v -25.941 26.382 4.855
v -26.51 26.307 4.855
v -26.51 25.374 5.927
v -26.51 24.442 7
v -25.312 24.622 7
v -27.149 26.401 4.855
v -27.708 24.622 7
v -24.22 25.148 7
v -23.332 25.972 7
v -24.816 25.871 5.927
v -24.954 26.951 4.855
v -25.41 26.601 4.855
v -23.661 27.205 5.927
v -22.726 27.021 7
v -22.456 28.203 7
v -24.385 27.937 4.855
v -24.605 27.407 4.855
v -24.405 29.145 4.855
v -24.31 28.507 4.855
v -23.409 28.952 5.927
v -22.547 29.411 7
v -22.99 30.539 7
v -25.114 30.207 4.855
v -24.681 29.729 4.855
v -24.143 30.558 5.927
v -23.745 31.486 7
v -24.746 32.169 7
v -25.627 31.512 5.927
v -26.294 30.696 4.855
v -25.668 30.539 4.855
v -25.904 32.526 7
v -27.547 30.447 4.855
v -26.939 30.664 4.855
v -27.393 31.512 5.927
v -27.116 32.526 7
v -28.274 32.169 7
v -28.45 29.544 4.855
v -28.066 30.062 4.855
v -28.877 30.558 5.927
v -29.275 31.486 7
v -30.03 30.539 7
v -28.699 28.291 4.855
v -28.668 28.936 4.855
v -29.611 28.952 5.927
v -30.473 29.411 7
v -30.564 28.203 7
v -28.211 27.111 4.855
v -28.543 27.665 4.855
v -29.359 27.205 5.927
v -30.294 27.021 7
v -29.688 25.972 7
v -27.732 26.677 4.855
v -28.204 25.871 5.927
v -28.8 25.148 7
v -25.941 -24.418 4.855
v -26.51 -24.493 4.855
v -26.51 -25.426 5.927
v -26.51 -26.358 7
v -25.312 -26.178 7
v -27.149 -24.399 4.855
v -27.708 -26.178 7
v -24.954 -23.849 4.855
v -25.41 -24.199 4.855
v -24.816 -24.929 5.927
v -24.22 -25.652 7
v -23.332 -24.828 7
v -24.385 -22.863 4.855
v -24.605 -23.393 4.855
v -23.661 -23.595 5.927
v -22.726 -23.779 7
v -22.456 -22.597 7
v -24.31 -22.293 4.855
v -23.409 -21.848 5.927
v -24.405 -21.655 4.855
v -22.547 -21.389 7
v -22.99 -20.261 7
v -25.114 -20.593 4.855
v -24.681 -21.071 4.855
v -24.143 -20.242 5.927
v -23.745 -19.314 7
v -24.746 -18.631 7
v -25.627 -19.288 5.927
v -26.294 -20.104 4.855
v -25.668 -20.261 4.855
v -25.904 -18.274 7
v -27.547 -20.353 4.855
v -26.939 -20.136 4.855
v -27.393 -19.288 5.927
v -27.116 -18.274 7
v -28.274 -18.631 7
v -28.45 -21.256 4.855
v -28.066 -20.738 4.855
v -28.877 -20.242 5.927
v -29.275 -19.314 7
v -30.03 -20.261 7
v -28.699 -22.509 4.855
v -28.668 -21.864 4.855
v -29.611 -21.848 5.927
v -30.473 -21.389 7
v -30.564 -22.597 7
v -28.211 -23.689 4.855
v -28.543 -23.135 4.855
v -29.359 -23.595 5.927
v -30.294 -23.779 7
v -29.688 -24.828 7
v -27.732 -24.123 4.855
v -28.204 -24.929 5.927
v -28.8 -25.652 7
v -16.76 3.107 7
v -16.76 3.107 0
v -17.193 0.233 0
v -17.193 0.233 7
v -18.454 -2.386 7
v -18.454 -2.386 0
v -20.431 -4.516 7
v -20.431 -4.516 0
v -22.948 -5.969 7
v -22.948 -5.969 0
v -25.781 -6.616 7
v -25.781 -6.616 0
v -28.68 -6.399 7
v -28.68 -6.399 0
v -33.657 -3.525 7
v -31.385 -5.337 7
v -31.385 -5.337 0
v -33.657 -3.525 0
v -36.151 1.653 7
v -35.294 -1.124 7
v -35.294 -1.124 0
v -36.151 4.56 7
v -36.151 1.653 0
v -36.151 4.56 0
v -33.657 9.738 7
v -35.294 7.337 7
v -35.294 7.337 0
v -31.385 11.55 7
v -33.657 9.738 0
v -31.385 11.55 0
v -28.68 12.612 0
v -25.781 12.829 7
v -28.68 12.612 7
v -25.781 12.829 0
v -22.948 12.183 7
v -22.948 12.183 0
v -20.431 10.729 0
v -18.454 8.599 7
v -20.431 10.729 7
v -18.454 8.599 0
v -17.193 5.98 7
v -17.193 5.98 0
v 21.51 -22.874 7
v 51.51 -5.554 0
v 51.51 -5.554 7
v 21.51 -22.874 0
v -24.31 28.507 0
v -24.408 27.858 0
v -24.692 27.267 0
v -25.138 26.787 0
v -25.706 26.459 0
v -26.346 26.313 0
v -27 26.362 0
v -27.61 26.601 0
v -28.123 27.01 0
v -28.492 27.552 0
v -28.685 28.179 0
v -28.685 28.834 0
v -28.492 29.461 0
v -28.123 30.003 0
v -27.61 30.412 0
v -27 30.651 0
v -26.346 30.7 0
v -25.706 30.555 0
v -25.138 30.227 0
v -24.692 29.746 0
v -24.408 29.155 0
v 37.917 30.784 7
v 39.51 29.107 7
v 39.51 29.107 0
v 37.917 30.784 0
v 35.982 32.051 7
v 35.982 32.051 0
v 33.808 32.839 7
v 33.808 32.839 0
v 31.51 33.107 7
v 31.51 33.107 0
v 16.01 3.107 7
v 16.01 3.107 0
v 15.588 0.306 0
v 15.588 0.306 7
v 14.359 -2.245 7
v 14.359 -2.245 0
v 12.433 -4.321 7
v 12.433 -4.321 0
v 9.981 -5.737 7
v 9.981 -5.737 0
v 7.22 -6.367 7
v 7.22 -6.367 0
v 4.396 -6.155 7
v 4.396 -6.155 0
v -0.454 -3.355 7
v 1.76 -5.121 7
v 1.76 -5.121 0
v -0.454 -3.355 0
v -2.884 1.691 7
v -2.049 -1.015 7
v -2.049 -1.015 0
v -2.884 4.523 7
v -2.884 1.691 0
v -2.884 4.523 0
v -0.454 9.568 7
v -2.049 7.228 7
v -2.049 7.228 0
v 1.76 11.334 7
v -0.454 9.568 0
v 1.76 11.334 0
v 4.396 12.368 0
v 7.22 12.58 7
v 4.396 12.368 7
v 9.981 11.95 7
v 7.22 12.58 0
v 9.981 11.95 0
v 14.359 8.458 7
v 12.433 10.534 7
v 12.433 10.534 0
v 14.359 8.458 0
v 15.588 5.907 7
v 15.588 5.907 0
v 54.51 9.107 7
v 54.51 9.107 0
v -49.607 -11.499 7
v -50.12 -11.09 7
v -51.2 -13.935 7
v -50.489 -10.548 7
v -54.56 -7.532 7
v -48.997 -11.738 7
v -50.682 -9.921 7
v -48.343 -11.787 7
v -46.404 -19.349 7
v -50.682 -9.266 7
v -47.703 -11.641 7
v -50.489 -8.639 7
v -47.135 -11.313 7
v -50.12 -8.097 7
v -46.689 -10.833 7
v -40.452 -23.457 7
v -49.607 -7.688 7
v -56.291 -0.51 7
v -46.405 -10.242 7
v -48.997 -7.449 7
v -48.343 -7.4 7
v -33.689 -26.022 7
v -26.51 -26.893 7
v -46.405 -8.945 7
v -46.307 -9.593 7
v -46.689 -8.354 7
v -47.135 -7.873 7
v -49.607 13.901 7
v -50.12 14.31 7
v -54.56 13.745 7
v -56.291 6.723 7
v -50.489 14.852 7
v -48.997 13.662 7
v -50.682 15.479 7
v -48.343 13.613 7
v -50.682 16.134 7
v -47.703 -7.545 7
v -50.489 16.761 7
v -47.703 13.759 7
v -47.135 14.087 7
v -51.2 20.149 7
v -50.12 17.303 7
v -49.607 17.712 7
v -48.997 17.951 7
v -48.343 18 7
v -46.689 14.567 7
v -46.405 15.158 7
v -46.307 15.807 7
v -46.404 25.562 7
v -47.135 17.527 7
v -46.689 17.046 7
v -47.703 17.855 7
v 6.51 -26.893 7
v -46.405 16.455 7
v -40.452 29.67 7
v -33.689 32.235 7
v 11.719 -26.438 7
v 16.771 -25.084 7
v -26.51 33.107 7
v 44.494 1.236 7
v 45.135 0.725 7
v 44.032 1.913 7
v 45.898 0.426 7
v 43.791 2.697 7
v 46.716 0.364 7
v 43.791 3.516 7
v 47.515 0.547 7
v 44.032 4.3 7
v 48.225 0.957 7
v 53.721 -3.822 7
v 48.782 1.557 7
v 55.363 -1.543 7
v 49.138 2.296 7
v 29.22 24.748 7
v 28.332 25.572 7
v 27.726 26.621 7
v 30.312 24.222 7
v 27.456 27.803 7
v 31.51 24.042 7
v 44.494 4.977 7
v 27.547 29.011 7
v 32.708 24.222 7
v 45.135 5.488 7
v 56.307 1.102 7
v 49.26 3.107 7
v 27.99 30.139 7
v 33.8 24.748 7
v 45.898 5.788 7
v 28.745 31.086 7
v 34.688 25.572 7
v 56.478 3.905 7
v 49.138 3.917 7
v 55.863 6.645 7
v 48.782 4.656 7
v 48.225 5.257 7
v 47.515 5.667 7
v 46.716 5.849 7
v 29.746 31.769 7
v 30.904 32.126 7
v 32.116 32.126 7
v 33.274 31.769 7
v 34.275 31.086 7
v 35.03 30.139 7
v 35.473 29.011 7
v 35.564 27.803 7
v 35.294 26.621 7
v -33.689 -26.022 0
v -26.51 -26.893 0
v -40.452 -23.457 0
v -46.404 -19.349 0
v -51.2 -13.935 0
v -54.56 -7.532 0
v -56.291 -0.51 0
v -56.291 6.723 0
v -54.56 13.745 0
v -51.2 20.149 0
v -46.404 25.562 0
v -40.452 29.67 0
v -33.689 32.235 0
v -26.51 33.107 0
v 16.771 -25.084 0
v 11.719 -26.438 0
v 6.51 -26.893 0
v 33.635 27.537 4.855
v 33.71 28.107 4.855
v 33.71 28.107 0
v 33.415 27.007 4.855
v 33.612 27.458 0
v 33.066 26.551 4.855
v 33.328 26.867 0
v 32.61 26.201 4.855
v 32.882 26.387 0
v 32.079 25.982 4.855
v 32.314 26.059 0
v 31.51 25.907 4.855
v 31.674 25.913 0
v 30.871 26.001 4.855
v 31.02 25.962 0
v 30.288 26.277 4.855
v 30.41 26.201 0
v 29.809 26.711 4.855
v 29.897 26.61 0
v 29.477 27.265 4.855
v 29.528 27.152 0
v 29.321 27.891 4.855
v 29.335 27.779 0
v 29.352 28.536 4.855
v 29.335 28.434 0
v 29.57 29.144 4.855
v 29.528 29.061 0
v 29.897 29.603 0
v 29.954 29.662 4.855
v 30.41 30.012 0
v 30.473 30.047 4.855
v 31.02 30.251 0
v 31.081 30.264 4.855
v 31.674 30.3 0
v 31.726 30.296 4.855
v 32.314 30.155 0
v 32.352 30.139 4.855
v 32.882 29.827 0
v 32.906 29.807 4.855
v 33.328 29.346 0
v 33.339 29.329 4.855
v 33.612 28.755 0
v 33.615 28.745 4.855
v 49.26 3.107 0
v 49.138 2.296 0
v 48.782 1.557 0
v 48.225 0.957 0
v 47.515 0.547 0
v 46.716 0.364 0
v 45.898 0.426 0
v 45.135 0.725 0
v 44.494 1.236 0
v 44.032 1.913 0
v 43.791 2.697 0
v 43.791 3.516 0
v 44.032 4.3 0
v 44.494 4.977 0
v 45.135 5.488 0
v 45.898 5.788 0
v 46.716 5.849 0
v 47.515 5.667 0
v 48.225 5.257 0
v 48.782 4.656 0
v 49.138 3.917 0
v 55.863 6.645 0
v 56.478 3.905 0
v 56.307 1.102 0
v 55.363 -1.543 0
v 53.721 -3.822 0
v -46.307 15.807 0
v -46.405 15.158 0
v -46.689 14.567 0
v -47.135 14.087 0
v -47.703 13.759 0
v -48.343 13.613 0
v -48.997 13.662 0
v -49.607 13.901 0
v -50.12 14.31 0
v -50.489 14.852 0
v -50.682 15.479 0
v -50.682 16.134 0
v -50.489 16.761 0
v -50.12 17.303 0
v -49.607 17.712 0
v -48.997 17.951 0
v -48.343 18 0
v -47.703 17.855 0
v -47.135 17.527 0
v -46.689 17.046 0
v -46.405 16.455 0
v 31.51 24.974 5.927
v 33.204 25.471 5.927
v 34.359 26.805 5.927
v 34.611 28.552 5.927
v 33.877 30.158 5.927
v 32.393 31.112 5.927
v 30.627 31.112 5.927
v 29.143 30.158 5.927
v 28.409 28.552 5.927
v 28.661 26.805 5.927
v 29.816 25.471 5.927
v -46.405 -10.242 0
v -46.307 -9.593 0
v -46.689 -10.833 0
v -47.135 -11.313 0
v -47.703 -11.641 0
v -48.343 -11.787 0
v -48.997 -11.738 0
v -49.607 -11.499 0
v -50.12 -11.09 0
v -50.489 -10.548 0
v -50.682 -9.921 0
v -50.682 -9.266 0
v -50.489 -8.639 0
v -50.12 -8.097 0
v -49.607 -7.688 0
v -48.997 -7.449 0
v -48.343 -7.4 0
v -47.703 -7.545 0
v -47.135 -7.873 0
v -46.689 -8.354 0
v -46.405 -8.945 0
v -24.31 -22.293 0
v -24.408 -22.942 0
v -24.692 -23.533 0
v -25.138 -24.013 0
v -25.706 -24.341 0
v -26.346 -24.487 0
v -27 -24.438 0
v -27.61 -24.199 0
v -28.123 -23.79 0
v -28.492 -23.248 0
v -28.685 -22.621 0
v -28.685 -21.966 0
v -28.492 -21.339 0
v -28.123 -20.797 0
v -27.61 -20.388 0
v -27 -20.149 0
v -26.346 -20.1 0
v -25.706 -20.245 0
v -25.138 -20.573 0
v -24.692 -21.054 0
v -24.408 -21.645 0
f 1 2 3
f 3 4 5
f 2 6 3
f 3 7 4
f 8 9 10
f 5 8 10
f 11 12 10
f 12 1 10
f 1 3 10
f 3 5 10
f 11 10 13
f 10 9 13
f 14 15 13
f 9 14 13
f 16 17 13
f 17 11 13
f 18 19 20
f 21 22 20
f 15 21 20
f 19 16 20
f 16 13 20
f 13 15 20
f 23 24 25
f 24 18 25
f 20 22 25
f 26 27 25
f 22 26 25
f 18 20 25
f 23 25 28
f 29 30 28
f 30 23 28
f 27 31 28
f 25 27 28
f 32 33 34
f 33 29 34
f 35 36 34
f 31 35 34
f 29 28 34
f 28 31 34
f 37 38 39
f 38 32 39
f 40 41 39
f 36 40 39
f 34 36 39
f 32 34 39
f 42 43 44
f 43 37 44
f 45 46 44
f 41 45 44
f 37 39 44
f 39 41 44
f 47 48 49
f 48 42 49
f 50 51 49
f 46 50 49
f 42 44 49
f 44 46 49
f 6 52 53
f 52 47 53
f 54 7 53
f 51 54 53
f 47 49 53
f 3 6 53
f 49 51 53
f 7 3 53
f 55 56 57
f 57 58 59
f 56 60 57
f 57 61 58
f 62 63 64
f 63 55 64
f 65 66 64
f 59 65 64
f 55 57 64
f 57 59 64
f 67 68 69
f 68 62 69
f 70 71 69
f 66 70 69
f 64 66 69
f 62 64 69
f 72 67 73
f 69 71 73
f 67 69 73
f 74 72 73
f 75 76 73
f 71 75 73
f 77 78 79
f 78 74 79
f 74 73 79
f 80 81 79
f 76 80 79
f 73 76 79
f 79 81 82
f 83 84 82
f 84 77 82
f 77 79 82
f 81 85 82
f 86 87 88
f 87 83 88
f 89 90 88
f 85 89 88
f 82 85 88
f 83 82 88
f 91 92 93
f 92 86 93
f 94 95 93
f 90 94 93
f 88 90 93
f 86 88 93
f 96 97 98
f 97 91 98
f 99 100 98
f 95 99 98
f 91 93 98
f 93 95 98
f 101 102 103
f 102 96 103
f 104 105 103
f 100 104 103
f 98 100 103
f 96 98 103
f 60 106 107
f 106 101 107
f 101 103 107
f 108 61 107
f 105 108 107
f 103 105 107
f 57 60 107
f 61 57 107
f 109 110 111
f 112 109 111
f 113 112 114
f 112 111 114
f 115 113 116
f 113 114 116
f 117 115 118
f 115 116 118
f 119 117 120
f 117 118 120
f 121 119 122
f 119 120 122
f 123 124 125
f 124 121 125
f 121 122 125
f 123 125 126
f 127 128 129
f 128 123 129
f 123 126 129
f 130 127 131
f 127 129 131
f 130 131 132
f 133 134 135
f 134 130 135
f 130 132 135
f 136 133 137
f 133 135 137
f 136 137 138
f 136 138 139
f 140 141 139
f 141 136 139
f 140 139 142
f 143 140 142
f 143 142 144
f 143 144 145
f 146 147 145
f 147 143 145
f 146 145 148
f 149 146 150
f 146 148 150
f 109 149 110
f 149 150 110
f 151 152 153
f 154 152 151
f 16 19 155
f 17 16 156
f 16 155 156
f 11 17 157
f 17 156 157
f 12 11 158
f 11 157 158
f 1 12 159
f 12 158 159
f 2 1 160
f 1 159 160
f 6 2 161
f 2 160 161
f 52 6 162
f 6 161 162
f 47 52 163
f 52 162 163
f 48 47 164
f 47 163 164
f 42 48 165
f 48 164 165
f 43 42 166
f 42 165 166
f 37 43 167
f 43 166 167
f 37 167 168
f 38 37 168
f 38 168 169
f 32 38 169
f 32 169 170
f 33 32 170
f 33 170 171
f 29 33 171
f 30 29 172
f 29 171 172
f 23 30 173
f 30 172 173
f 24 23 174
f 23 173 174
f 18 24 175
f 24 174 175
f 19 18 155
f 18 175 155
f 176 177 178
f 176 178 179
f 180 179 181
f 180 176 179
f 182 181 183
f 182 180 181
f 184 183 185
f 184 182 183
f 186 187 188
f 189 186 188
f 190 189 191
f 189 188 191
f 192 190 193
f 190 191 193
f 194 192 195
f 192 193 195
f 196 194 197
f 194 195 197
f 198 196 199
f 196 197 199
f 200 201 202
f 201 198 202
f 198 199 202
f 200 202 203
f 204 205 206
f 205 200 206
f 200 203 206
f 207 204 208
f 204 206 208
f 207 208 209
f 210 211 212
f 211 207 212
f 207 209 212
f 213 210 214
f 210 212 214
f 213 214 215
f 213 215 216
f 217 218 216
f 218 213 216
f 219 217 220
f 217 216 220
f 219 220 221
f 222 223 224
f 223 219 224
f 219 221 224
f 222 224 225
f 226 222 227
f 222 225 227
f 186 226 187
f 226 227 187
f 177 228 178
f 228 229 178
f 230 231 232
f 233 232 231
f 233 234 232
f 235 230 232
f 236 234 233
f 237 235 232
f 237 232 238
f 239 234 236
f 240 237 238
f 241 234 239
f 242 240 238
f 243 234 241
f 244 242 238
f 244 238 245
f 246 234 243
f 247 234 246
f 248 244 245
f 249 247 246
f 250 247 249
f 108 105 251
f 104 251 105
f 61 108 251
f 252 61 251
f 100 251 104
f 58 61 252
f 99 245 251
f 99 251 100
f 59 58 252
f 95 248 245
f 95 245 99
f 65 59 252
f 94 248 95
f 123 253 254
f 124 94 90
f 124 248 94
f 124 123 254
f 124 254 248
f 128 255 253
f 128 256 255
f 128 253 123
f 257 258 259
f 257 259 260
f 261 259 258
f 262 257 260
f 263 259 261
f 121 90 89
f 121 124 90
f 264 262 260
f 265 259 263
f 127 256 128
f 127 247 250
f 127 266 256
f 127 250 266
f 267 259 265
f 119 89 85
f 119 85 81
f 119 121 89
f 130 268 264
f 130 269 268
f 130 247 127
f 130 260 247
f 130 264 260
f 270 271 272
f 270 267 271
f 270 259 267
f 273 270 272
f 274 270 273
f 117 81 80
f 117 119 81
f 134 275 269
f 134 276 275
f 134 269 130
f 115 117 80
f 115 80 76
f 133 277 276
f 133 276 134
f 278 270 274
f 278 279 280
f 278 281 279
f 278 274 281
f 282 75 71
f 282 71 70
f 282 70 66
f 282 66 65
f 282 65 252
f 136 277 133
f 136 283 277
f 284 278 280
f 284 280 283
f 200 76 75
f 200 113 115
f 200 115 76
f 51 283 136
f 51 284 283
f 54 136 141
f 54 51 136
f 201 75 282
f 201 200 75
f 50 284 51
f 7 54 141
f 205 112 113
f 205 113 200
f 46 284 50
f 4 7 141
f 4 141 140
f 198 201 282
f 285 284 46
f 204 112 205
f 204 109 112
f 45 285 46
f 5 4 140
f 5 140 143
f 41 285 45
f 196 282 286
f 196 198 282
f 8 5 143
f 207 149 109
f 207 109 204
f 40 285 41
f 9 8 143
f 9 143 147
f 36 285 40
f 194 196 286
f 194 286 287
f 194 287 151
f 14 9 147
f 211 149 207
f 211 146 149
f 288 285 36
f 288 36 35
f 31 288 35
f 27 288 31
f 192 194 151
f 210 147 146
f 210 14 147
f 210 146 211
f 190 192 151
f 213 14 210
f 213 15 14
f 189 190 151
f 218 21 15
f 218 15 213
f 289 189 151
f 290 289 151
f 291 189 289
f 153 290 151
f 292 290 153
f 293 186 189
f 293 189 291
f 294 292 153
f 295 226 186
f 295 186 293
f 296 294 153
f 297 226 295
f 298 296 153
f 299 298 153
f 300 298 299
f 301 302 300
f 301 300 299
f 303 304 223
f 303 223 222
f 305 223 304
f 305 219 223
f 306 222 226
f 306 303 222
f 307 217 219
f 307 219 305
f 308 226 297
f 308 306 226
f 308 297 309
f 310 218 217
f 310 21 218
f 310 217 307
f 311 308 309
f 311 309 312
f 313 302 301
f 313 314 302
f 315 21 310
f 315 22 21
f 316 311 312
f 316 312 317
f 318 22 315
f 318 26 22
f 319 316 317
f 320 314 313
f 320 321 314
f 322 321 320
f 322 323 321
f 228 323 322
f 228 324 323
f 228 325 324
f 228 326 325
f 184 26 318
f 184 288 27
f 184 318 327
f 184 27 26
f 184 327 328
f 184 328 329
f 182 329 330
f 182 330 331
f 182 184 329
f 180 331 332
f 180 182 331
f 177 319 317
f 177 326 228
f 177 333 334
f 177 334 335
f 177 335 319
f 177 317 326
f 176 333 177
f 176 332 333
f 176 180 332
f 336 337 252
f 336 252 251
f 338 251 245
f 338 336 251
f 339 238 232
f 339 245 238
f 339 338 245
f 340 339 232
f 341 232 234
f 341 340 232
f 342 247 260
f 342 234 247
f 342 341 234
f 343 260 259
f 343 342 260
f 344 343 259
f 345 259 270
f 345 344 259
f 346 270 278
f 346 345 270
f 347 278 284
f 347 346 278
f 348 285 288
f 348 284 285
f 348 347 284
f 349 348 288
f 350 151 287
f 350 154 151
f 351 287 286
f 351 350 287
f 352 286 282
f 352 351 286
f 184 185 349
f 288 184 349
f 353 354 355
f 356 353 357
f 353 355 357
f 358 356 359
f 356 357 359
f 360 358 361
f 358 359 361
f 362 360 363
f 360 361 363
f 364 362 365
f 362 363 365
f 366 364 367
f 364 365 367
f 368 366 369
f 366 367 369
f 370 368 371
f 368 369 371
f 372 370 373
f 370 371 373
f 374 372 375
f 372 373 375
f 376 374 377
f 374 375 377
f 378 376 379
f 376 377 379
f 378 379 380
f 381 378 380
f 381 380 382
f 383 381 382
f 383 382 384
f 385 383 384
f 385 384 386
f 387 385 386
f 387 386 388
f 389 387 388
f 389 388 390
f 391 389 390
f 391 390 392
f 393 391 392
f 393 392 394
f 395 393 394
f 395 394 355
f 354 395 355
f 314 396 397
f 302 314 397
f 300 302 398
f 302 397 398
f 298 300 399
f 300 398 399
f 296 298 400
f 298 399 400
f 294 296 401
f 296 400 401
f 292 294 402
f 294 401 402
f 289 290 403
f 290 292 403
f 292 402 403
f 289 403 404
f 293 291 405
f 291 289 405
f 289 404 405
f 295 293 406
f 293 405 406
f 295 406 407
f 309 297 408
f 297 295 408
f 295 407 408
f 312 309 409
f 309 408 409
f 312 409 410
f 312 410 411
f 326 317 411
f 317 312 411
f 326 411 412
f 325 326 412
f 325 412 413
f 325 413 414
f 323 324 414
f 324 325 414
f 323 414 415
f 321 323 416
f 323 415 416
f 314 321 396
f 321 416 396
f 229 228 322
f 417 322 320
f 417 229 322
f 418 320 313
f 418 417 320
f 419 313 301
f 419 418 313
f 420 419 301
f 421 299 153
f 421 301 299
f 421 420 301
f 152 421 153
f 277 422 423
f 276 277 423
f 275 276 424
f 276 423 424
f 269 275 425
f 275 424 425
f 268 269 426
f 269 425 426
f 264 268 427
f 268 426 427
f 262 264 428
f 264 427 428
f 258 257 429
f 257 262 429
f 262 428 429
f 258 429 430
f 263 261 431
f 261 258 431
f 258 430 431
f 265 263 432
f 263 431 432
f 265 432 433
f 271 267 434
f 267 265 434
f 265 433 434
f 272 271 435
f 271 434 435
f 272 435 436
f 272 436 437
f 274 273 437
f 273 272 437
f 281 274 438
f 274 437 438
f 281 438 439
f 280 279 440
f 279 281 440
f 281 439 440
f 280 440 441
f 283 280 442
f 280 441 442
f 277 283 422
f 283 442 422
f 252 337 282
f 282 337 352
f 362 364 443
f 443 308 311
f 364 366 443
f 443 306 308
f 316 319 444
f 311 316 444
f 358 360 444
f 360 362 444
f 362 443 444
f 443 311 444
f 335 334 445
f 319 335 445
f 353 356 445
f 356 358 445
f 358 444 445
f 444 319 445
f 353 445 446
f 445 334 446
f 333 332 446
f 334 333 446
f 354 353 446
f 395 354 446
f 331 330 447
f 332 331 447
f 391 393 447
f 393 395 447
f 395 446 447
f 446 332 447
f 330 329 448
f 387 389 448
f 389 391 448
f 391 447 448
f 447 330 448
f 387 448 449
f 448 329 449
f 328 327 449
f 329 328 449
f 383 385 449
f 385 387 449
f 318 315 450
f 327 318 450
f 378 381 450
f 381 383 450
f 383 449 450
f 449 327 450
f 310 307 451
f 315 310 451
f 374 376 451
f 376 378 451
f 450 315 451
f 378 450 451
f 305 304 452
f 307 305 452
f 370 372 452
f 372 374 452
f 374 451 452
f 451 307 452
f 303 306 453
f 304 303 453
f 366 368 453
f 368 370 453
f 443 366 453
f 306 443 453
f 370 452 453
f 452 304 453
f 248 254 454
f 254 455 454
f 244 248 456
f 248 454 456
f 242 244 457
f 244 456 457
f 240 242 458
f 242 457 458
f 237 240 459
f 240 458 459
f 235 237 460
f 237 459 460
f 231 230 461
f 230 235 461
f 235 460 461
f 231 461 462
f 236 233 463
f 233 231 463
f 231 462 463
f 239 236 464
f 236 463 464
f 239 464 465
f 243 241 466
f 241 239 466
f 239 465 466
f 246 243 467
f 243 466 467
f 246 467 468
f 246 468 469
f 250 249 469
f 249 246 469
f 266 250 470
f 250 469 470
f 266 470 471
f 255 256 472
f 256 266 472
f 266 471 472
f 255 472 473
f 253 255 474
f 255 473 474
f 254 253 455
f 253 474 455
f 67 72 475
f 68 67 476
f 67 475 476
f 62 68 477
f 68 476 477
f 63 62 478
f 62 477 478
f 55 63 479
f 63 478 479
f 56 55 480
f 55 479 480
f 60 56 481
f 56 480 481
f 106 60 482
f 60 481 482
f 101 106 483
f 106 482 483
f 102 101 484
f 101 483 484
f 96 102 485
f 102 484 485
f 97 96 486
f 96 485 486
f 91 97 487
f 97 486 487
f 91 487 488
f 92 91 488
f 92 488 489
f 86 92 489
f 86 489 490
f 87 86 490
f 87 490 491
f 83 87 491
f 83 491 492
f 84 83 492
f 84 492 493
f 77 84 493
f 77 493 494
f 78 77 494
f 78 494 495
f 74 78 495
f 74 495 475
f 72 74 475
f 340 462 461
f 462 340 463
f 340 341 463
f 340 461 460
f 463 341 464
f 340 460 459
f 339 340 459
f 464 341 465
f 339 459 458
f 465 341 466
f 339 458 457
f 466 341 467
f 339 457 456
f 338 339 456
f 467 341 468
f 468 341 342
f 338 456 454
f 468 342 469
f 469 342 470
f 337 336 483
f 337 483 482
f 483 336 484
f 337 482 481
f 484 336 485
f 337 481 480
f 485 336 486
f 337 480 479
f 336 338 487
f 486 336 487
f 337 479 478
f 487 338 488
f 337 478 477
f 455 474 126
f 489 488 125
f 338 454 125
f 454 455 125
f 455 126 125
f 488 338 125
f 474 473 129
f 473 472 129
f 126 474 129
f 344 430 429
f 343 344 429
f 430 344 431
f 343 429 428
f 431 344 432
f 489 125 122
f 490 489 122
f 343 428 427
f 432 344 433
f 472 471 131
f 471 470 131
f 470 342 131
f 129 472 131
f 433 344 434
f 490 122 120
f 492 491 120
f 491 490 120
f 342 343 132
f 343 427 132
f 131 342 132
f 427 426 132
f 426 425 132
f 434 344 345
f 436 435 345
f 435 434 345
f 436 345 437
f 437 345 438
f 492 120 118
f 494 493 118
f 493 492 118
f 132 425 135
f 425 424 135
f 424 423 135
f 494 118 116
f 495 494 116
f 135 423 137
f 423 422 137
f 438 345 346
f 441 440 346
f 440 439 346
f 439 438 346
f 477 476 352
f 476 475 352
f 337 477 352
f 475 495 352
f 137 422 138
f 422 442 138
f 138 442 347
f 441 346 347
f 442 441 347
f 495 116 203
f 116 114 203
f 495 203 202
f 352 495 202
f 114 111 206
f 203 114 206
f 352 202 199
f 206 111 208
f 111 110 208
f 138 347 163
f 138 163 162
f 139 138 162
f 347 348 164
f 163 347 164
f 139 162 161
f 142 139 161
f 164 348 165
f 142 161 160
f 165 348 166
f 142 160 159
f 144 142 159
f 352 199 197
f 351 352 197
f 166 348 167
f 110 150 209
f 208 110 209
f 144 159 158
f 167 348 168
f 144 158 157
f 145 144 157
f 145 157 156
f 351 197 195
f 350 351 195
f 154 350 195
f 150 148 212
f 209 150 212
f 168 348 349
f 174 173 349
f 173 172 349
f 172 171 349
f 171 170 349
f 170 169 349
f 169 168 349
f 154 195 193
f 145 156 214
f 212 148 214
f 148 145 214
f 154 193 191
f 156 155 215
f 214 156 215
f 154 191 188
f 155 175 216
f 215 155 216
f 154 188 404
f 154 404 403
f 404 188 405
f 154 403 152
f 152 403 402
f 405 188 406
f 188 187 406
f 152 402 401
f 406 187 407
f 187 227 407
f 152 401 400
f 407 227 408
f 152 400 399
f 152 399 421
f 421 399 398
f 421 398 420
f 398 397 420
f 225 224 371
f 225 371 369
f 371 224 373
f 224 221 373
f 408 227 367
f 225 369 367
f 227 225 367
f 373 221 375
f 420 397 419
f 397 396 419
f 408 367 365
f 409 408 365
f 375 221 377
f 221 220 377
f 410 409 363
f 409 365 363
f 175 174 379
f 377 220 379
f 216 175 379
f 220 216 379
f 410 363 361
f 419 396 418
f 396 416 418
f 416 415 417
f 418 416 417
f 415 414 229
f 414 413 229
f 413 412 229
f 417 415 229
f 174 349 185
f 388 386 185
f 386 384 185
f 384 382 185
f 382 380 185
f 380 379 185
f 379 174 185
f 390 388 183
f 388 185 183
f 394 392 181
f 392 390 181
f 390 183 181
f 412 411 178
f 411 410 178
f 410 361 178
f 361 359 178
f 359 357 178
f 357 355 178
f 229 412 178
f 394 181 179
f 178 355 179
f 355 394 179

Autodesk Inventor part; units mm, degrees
ref_plane "YZ Plane" through (0, 0, 0) normal (1, 0, 0) x (0, 1, 0)
ref_plane "XZ Plane" through (0, 0, 0) normal (0, 1, 0) x (-1, 0, 0)
ref_plane "XY Plane" through (0, 0, 0) normal (0, 0, 1) x (1, 0, 0)
sketch "Sketch1" plane through (-26.51, 3.1066, 0) normal (0, 0, 1) x (1, 0, 0)
  circle A0 centre (0, 0) radius 7.62 construction
  circle A1 centre (0, 0) radius 9.75
  circle A2 centre (33.02, 0) radius 25.4 construction
  line L0 (0, 0) -> (7.62, 0)
  line L1 (0, 0) -> (7.62, 0) construction
  circle A3 centre (33.02, 0) radius 9.5
  line L2 (0, -30) -> (33.02, -30)
  line L3 (33.02, 30) -> (0, 30)
  arc A4 (33.02, -30) -> (63.02, 0) centre (33.02, 0) ccw
  arc A5 (0, 30) -> (0, -30) centre (0, 0) ccw
  circle A6 centre (0, 0) radius 25.4 construction
  line L4 (0, 25.4) -> (0, 0) construction
  line L5 (0, 25.4) -> (25.4, 25.4) construction
  circle A7 centre (0, 25.4) radius 2.2
  circle A8 centre (-21.997, 12.7) radius 2.2
  circle A9 centre (-21.997, -12.7) radius 2.2
  circle A10 centre (0, -25.4) radius 2.2
  circle A11 centre (21.997, -12.7) radius 2.2
  circle A12 centre (21.997, 12.7) radius 2.2
  line L6 (63.02, 0) -> (63.02, 30)
  line L7 (63.02, 30) -> (33.02, 30)
  circle A13 centre (58.02, 25) radius 2.2
  circle A14 centre (73.02, 0) radius 2.75
  circle A15 centre (73.02, 0) radius 10
  line L8 (81.02, 6) -> (63.02, 30)
  line L9 (78.02, -8.6603) -> (48.02, -25.9808)
  dimension "d13" = 50.8
  dimension "d21" = 15.24
  dimension "d20" = 19.5
  dimension "d18" = 50.8
  dimension "d17" = 7.62
  dimension "d25" = 0
  dimension "d19" = 33.02
  dimension "d16" = 19
  dimension "d14" = 30
  dimension "d15" = 60
  dimension "d26" = 25.4
  dimension "d27" = 90
  dimension "d12" = 4.4
  dimension "d2" = 360
  dimension "d11" = 30
  dimension "d9" = 30
  dimension "d10" = 90
  dimension "d6" = 4.4
  dimension "d8" = 5
  dimension "d7" = 5
  dimension "d4" = 5.5
  dimension "d5" = 10
  dimension "d3" = 20
extrude "Extrusion1" add sketch "Sketch1" along normal blind 7 contours A5 L3 L7 L6 A4 L2 | A4 A15 L9 | L6 L8 A15 | A15 | A11 | A12
fillet "Fillet1" radius 10 1 edges at (36.51, 33.1066, 3.5)
sketch "Sketch2" plane through (-26.51, 3.1066, 7) normal (0, 0, 1) x (1, 0, 0)
  circle A0 centre (0, 25.4) radius 2.2 projected
  circle A1 centre (0, -25.4) radius 2.2 projected
  circle A2 centre (58.02, 25) radius 2.2 projected
  point P0 (26.51, -3.1066)
hole "Hole1" at (-26.51, 28.5066, 7) at (31.51, 28.1066, 7) at (-26.51, -22.2934, 7) direction (0, 0, -1) diameter 4.4 depth 7 countersink diameter 8.13 countersink angle 82
properties part number "Outer Plate" material "Aluminum 6061"
